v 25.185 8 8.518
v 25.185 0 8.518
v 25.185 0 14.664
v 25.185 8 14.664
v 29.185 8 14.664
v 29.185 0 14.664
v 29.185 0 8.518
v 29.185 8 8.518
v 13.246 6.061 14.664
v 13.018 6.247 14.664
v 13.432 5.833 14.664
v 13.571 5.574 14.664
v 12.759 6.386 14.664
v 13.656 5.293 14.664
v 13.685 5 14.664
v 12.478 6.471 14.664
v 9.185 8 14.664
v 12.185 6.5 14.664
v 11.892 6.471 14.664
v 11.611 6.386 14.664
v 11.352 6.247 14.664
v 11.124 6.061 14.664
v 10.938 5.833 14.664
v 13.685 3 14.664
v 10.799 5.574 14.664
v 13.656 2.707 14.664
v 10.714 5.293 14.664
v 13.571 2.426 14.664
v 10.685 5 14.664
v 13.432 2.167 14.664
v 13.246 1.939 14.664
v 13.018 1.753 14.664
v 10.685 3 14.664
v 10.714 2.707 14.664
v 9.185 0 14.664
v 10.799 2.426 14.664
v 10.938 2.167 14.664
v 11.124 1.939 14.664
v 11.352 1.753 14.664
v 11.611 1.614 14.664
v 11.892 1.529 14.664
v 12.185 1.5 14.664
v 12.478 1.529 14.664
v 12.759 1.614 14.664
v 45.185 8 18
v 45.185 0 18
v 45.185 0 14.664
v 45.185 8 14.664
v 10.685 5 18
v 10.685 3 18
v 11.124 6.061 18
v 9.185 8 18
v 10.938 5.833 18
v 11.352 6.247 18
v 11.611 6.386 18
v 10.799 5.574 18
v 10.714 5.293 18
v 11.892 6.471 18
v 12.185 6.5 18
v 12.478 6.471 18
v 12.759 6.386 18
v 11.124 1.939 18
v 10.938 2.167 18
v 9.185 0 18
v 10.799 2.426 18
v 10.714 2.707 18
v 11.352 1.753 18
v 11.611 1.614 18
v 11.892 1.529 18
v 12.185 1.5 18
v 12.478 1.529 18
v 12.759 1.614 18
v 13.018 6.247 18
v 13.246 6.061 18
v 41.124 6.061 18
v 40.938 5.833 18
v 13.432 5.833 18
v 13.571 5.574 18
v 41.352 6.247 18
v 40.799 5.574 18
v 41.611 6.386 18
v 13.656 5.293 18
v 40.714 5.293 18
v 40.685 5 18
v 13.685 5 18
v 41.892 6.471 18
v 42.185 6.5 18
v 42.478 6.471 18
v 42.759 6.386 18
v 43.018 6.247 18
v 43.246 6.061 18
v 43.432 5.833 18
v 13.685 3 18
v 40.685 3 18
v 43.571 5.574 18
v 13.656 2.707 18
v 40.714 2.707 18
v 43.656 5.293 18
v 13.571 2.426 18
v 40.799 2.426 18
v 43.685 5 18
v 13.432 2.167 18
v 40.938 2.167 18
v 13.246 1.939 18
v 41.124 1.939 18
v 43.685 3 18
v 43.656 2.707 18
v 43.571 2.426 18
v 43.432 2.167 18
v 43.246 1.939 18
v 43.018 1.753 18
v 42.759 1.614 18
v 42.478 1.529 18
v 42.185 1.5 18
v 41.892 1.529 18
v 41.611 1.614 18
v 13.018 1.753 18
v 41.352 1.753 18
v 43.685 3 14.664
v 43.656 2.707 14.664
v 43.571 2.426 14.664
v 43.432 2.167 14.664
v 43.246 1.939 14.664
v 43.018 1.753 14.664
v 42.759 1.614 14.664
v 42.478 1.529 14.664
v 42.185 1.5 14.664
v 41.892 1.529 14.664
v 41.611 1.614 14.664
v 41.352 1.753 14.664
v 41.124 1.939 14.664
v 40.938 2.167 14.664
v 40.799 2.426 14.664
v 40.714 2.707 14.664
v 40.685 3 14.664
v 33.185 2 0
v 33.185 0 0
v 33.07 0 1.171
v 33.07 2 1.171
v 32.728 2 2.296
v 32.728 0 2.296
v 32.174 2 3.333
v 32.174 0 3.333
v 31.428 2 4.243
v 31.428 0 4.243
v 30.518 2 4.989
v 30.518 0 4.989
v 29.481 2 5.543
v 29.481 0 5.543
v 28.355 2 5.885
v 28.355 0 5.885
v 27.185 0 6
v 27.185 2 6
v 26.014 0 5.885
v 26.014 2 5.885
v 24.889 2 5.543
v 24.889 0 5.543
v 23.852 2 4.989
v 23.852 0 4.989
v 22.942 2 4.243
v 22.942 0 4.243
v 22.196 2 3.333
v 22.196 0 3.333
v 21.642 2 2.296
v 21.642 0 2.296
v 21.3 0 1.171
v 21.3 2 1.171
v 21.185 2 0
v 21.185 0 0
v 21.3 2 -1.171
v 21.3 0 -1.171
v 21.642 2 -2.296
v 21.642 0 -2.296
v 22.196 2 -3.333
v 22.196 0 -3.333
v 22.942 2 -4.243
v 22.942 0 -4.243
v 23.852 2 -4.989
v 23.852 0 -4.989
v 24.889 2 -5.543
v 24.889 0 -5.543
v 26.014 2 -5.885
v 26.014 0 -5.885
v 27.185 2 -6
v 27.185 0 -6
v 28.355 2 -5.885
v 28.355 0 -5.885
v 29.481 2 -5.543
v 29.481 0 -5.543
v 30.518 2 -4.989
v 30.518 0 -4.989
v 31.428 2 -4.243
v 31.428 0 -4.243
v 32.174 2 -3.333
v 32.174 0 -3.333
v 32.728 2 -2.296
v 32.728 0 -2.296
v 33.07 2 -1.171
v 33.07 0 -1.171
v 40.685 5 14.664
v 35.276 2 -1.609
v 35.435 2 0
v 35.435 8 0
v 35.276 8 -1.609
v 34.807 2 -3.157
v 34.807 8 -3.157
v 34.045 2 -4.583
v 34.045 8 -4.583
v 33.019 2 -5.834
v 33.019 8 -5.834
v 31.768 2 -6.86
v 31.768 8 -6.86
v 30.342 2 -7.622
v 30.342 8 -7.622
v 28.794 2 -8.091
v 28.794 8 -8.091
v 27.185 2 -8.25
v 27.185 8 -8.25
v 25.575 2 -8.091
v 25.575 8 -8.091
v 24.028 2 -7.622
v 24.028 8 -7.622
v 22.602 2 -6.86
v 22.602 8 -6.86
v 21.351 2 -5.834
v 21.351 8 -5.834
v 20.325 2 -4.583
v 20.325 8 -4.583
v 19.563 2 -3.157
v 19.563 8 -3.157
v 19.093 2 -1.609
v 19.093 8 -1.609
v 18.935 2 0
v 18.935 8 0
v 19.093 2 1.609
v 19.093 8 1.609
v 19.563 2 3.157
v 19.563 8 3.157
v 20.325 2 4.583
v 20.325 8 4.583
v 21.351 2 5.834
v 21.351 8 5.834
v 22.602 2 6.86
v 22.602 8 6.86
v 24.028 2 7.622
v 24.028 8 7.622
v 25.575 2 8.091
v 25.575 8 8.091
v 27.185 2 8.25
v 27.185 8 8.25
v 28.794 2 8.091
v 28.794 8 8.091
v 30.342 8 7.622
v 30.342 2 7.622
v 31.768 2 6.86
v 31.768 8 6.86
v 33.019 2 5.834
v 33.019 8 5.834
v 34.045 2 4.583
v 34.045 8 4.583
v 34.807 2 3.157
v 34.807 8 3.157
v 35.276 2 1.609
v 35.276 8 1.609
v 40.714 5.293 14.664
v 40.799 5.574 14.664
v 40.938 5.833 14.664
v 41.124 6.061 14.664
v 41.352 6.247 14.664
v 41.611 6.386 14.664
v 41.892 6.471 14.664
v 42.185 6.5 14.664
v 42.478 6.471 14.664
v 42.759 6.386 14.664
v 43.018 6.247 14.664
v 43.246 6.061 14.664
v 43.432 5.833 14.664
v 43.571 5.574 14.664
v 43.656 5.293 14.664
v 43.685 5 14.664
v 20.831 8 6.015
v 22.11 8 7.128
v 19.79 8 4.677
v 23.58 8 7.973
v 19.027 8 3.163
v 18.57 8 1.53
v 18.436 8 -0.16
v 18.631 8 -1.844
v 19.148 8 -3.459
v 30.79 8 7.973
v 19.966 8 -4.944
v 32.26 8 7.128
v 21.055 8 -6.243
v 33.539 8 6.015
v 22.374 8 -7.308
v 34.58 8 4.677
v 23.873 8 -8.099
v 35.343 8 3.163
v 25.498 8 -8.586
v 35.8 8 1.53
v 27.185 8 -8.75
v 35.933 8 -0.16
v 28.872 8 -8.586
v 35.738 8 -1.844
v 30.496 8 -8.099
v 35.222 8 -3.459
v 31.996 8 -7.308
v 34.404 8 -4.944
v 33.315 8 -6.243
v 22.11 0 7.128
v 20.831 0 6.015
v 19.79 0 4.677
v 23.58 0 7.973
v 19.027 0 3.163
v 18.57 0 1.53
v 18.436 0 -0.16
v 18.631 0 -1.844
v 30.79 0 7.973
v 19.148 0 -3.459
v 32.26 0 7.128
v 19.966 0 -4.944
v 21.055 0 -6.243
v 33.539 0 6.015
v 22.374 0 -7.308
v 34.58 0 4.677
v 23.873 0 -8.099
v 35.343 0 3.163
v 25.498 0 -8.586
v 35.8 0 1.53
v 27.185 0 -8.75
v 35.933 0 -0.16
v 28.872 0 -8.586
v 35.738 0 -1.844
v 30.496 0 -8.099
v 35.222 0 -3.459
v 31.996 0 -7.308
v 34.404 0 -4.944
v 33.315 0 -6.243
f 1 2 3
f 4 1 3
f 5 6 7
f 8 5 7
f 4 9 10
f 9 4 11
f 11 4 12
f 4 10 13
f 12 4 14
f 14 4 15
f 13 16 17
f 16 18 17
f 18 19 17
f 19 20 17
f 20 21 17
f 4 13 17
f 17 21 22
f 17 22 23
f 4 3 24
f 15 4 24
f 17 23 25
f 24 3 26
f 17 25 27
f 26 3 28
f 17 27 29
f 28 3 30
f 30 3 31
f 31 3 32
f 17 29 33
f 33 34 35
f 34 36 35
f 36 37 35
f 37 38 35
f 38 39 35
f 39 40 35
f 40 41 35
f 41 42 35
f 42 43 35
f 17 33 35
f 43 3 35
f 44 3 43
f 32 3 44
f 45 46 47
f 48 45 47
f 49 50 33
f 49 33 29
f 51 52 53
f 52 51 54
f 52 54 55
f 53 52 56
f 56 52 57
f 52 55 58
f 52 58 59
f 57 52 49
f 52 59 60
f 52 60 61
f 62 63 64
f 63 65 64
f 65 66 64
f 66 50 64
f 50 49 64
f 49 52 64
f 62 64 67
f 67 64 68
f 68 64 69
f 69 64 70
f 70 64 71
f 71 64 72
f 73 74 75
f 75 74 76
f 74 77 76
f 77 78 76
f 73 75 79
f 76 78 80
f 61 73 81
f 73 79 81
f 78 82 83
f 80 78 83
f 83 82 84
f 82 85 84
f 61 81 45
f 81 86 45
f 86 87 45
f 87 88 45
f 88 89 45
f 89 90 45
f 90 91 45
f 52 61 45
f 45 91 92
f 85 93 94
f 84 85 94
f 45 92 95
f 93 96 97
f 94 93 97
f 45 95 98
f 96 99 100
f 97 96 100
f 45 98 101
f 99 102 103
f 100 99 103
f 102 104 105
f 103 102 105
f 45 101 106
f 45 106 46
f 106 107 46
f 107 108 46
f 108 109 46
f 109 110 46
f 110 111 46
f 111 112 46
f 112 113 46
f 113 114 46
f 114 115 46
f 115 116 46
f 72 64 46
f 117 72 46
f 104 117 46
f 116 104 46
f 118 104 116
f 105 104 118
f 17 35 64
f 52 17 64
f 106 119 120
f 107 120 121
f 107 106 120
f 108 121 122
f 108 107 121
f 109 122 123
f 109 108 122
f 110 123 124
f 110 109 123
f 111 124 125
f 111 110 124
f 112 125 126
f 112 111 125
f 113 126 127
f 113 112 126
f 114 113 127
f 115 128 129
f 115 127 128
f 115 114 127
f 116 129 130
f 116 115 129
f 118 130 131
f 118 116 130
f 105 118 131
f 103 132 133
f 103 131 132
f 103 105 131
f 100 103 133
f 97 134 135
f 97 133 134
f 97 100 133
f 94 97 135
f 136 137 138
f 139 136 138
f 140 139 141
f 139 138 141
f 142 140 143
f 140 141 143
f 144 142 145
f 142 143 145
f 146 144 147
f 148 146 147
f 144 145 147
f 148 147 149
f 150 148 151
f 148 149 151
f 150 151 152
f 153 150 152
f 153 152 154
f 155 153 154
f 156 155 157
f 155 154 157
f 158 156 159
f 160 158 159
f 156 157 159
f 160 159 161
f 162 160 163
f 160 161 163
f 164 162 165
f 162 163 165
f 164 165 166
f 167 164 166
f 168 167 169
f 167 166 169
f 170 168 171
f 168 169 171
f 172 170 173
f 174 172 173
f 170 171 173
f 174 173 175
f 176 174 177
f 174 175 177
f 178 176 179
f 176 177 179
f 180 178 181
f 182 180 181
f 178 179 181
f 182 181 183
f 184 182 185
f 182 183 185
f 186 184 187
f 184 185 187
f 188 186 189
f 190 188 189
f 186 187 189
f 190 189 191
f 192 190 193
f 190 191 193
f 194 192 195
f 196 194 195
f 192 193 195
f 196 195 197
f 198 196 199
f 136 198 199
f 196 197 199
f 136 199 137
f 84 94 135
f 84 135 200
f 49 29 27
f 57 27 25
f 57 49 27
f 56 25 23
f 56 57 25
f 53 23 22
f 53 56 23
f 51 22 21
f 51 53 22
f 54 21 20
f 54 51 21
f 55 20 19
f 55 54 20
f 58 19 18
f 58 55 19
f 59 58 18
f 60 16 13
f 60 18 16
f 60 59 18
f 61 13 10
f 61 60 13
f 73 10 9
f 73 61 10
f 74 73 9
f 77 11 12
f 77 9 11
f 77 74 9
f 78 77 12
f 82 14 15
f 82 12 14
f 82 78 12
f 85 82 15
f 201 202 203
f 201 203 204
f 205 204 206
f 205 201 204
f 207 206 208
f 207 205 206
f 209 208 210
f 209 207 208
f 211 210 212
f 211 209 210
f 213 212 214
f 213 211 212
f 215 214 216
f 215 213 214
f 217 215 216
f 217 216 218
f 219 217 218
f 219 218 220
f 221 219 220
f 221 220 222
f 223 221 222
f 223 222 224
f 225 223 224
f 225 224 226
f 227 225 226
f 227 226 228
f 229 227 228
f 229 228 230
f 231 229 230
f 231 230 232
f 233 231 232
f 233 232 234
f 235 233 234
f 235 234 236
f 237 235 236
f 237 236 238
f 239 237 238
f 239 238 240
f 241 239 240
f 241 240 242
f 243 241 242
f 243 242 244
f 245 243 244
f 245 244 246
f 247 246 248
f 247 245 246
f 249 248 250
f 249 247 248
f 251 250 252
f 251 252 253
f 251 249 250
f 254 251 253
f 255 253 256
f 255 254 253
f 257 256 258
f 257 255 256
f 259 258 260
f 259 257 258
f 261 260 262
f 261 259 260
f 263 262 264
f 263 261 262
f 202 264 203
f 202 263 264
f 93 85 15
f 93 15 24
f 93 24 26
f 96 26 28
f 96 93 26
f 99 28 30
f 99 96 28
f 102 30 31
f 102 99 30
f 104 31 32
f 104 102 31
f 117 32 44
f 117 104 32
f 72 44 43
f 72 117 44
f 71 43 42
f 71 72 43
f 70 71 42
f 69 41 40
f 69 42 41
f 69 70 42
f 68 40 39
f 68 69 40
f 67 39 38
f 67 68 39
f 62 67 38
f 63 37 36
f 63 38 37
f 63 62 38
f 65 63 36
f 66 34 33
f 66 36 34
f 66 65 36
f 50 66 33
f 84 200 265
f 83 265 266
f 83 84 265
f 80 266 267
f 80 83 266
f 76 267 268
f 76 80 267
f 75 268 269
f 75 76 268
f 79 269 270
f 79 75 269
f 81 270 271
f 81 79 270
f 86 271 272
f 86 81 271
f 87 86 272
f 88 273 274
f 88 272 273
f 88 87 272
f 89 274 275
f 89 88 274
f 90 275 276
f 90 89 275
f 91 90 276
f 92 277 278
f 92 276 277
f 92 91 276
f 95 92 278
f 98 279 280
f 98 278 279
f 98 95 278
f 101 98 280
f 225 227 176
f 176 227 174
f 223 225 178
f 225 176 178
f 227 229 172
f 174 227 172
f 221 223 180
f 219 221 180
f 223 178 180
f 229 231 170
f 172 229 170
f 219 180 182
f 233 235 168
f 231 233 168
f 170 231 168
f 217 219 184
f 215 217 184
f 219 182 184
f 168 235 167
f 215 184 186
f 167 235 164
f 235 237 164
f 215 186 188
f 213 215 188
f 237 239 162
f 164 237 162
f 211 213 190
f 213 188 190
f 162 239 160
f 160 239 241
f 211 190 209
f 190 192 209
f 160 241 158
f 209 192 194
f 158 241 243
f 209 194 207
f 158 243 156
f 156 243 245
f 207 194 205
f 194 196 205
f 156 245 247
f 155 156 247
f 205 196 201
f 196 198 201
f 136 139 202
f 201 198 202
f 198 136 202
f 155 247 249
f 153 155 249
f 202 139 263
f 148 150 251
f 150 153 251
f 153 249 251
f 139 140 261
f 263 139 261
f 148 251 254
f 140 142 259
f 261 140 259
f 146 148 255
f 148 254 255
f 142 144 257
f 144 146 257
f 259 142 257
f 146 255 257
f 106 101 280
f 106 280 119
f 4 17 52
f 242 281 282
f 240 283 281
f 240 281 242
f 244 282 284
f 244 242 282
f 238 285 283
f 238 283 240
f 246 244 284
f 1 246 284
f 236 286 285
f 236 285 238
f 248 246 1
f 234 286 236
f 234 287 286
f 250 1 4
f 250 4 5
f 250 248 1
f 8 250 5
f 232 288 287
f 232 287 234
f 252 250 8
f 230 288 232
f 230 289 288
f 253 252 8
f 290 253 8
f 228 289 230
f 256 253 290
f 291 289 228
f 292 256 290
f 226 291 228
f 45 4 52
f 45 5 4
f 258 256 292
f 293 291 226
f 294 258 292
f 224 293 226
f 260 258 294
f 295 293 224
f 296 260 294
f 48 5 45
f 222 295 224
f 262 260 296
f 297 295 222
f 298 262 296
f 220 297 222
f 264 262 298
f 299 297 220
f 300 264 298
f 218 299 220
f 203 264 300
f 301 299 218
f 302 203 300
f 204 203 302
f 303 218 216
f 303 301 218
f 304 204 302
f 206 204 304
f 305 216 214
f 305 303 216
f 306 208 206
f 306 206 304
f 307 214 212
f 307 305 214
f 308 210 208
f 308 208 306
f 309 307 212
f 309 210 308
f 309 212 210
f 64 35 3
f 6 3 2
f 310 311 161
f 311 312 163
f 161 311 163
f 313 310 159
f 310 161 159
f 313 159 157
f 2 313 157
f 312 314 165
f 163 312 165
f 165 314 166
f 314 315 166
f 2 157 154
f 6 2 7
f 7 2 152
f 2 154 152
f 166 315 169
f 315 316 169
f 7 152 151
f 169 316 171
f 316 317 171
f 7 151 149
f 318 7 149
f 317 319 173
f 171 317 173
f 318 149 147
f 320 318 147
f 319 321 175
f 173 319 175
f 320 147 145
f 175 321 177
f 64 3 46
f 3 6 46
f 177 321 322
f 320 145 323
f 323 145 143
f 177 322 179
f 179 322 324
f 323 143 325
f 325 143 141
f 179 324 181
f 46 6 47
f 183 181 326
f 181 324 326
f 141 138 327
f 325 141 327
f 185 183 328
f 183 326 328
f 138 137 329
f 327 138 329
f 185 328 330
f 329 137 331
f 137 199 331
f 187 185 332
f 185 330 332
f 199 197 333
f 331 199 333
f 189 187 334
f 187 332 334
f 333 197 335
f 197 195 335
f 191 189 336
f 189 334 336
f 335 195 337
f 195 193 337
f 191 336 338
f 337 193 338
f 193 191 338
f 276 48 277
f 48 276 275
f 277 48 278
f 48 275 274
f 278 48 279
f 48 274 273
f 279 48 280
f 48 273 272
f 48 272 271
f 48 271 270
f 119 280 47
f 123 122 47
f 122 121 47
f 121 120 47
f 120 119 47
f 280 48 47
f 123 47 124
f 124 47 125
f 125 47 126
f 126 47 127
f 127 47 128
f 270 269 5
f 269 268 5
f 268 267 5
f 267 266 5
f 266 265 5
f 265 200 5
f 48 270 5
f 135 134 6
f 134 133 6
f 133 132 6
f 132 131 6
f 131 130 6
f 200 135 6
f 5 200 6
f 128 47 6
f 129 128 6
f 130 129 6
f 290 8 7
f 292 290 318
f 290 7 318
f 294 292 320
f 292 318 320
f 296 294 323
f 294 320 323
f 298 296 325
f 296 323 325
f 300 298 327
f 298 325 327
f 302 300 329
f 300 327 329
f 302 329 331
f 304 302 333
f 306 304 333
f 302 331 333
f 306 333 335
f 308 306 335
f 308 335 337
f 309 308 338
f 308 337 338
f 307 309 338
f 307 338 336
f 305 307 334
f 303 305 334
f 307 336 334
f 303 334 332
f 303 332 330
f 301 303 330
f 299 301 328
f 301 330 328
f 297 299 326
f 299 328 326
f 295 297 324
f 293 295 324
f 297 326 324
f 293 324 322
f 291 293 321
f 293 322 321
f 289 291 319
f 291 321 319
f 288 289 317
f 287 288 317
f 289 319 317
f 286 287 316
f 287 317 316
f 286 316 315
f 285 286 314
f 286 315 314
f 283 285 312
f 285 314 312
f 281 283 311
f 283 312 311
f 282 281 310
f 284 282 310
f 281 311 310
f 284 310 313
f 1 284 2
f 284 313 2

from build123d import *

# Parameters (mm, degrees)
SKETCH_1_R          = 8.75
SKETCH_1_R_2        = 8.25
EXTRUDE_2_DEPTH     = 10
SKETCH_2_R          = 8.25
SKETCH_2_R_2        = 2
EXTRUDE_3_DEPTH     = 4
EXTRUDE_4_DEPTH     = 8
SKETCH_5_W          = 3
SKETCH_5_H          = 8
EXTRUDE_5_DEPTH     = 3
SKETCH_6_W          = 3
SKETCH_6_H          = 8
EXTRUDE_6_DEPTH     = 3
SKETCH_7_R          = 1.5
CUT_EXTRUDE_1_DEPTH = 3
FILLET_1_R          = 5
FILLET_3_R          = 2
SKETCH_8_R          = 8.75
SKETCH_8_R_2        = 8.25
EXTRUDE_7_DEPTH     = 8
SKETCH_9_R          = 8.25
SKETCH_9_R_2        = 6
EXTRUDE_8_DEPTH     = 2
EXTRUDE_9_DEPTH     = 8
SKETCH_11_R         = 1.5
CUT_EXTRUDE_2_DEPTH = 8
CUT_EXTRUDE_3_DEPTH = 8
CUT_EXTRUDE_4_DEPTH = 8
SKETCH_14_R         = 8.75
SKETCH_14_R_2       = 8.25
EXTRUDE_10_DEPTH    = 8
EXTRUDE_11_DEPTH    = 8
SKETCH_16_R         = 1.5
CUT_EXTRUDE_5_DEPTH = 8
CUT_EXTRUDE_6_DEPTH = 10
CUT_EXTRUDE_7_DEPTH = 10


with BuildPart() as part:
    # 草图1 → 凸台-拉伸2 (new body)
    with BuildSketch(Plane(origin=(0, 0, 0), x_dir=(1, 0, 0), z_dir=(0, 1, 0))):
        Circle(SKETCH_1_R)
        Circle(SKETCH_1_R_2, mode=Mode.SUBTRACT)
    extrude(amount=EXTRUDE_2_DEPTH)

    # 草图2 → 凸台-拉伸3 (add)
    with BuildSketch(Plane(origin=(0, 0, 0), x_dir=(1, 0, 0), z_dir=(0, 1, 0))):
        Circle(SKETCH_2_R)
        Circle(SKETCH_2_R_2, mode=Mode.SUBTRACT)
    extrude(amount=EXTRUDE_3_DEPTH)

    # 草图3 → 凸台-拉伸4 (add)
    with BuildSketch(Plane(origin=(0, 0, 0), x_dir=(1, 0, 0), z_dir=(0, 1, 0))):
        Polygon((-2, 8.518362519), (2, 8.518362519), (2, 15), (15, 15), (15, 18), (2, 18), (-2, 18), (-15, 18), (-15, 15), (-2, 15), align=None)
    extrude(amount=EXTRUDE_4_DEPTH)

    # 草图5 → 凸台-拉伸5 (add)
    with BuildSketch(Plane(origin=(15, 0, 0), x_dir=(0, 0, -1), z_dir=(1, 0, 0))):
        with Locations((16.5, 4)):
            Rectangle(SKETCH_5_W, SKETCH_5_H)
    extrude(amount=EXTRUDE_5_DEPTH)

    # 草图6 → 凸台-拉伸6 (add)
    with BuildSketch(Plane.ZY.offset(15)):
        with Locations((-16.5, 4)):
            Rectangle(SKETCH_6_W, SKETCH_6_H)
    extrude(amount=EXTRUDE_6_DEPTH)

    # 草图7 → 切除-拉伸1 (cut)
    with BuildSketch(Plane(origin=(0, 0, -18), x_dir=(-1, 0, 0), z_dir=(0, 0, -1))):
        with Locations((-15, 3.754021035)):
            Circle(SKETCH_7_R)
    cut_extrude_1 = extrude(amount=-CUT_EXTRUDE_1_DEPTH, mode=Mode.SUBTRACT)

    # 镜向1: 切除-拉伸1 across plane
    add(cut_extrude_1.mirror(Plane(origin=(0, 0, 0), x_dir=(0, 0, 1), z_dir=(1, 0, 0))), mode=Mode.SUBTRACT)

    # 圆角1
    fillet_1_edges = [part.edges().sort_by_distance(p)[0] for p in [
        (-2, 4, -8.518362519),
        (2, 4, -8.518362519),
    ]]
    fillet(fillet_1_edges, radius=FILLET_1_R)

    # 圆角3
    fillet_3_edges = [part.edges().sort_by_distance(p)[0] for p in [
        (-2, 4, -15),
        (2, 4, -15),
    ]]
    fillet(fillet_3_edges, radius=FILLET_3_R)

    # 草图17 → 切除-拉伸6 (cut)
    with BuildSketch(Plane(origin=(0, 0, 0), x_dir=(1, 0, 0), z_dir=(0, 1, 0))):
        Polygon((-27.724622817, 21.69601187), (-7.349237756, -14.338233932), (7.177657148, -11.696980313), (13.592130223, 5.659829184), (24.157144699, 16.036182687), (2.467165325, 27.553795746), (0, 27.553795746), align=None)
    extrude(amount=CUT_EXTRUDE_6_DEPTH, mode=Mode.SUBTRACT)


with BuildPart() as body_2:
    # 草图8 → 凸台-拉伸7 (new body)
    with BuildSketch(Plane(origin=(0, 0, 0), x_dir=(1, 0, 0), z_dir=(0, 1, 0))):
        with Locations((27.184954533, 0)):
            Circle(SKETCH_8_R)
        with Locations((27.184954533, 0)):
            Circle(SKETCH_8_R_2, mode=Mode.SUBTRACT)
    extrude(amount=EXTRUDE_7_DEPTH)

    # 草图9 → 凸台-拉伸8 (add)
    with BuildSketch(Plane.XZ):
        with Locations((27.184954533, 0)):
            Circle(SKETCH_9_R)
        with Locations((27.184954533, 0)):
            Circle(SKETCH_9_R_2, mode=Mode.SUBTRACT)
    extrude(amount=-EXTRUDE_8_DEPTH)

    # 草图10 → 凸台-拉伸9 (add)
    with BuildSketch(Plane(origin=(0, 0, 0), x_dir=(1, 0, 0), z_dir=(0, 1, 0))):
        Polygon((27.184954533, -18), (45.184954533, -18), (45.184954533, -14.663867829), (29.184954533, -14.663867829), (29.184954533, -8.518362519), (25.184954533, -8.518362519), (25.184954533, -14.663867829), (9.184954533, -14.663867829), (9.184954533, -18), align=None)
    extrude(amount=EXTRUDE_9_DEPTH)

    # 草图11 → 切除-拉伸2 (cut)
    with BuildSketch(Plane.XY.offset(18)):
        with Locations((12.184954533, 4)):
            Circle(SKETCH_11_R)
        with Locations((42.184954533, 4)):
            Circle(SKETCH_11_R)
    extrude(amount=-CUT_EXTRUDE_2_DEPTH, mode=Mode.SUBTRACT)

    # 草图12 → 切除-拉伸3 (cut)
    with BuildSketch(Plane.XY.offset(18)):
        with BuildLine():
            Line((10.684954533, 4), (10.684954533, 5))
            ThreePointArc((10.684954533, 5), (12.184954533, 6.5), (13.684954533, 5))
            Line((13.684954533, 5), (13.684954533, 4))
            Line((13.684954533, 4), (13.684954533, 3))
            ThreePointArc((13.684954533, 3), (12.184954533, 1.5), (10.684954533, 3))
            Line((10.684954533, 3), (10.684954533, 4))
        make_face()
    extrude(amount=-CUT_EXTRUDE_3_DEPTH, mode=Mode.SUBTRACT)

    # 草图13 → 切除-拉伸4 (cut)
    with BuildSketch(Plane.XY.offset(18)):
        with BuildLine():
            Line((40.684954533, 4), (40.684954533, 5))
            ThreePointArc((40.684954533, 5), (42.184954533, 6.5), (43.684954533, 5))
            Line((43.684954533, 5), (43.684954533, 4))
            Line((43.684954533, 4), (43.684954533, 3))
            ThreePointArc((43.684954533, 3), (42.184954533, 1.5), (40.684954533, 3))
            Line((40.684954533, 3), (40.684954533, 4))
        make_face()
    extrude(amount=-CUT_EXTRUDE_4_DEPTH, mode=Mode.SUBTRACT)


with BuildPart() as body_3:
    # 草图14 → 凸台-拉伸10 (new body)
    with BuildSketch(Plane(origin=(0, 0, 0), x_dir=(1, 0, 0), z_dir=(0, 1, 0))):
        with Locations((-35.091635024, 0)):
            Circle(SKETCH_14_R)
        with Locations((-35.091635024, 0)):
            Circle(SKETCH_14_R_2, mode=Mode.SUBTRACT)
    extrude(amount=EXTRUDE_10_DEPTH)

    # 草图15 → 凸台-拉伸11 (add)
    with BuildSketch(Plane(origin=(0, 0, 0), x_dir=(1, 0, 0), z_dir=(0, 1, 0))):
        Polygon((-37.091635024, -15), (-37.091635024, -8.518362519), (-33.091635024, -8.518362519), (-33.091635024, -15), (-17.091635024, -15), (-17.091635024, -18), (-53.091635024, -18), (-53.091635024, -15), align=None)
    extrude(amount=EXTRUDE_11_DEPTH)

    # 草图16 → 切除-拉伸5 (cut)
    with BuildSketch(Plane.XY.offset(18)):
        with Locations((-50.091635024, 4)):
            Circle(SKETCH_16_R)
        with Locations((-20.091635024, 4)):
            Circle(SKETCH_16_R)
    extrude(amount=-CUT_EXTRUDE_5_DEPTH, mode=Mode.SUBTRACT)

    # 草图18 → 切除-拉伸7 (cut)
    with BuildSketch(Plane(origin=(0, 0, 0), x_dir=(1, 0, 0), z_dir=(0, 1, 0))):
        Polygon((-5.334341173, 26.542566247), (-7.107938045, -29.653340051), (-79.00930818, -22.653952159), (-79.00930818, -19.085416228), (-48.199741002, 26.542566247), align=None)
    extrude(amount=CUT_EXTRUDE_7_DEPTH, mode=Mode.SUBTRACT)


solid = body_2.part
